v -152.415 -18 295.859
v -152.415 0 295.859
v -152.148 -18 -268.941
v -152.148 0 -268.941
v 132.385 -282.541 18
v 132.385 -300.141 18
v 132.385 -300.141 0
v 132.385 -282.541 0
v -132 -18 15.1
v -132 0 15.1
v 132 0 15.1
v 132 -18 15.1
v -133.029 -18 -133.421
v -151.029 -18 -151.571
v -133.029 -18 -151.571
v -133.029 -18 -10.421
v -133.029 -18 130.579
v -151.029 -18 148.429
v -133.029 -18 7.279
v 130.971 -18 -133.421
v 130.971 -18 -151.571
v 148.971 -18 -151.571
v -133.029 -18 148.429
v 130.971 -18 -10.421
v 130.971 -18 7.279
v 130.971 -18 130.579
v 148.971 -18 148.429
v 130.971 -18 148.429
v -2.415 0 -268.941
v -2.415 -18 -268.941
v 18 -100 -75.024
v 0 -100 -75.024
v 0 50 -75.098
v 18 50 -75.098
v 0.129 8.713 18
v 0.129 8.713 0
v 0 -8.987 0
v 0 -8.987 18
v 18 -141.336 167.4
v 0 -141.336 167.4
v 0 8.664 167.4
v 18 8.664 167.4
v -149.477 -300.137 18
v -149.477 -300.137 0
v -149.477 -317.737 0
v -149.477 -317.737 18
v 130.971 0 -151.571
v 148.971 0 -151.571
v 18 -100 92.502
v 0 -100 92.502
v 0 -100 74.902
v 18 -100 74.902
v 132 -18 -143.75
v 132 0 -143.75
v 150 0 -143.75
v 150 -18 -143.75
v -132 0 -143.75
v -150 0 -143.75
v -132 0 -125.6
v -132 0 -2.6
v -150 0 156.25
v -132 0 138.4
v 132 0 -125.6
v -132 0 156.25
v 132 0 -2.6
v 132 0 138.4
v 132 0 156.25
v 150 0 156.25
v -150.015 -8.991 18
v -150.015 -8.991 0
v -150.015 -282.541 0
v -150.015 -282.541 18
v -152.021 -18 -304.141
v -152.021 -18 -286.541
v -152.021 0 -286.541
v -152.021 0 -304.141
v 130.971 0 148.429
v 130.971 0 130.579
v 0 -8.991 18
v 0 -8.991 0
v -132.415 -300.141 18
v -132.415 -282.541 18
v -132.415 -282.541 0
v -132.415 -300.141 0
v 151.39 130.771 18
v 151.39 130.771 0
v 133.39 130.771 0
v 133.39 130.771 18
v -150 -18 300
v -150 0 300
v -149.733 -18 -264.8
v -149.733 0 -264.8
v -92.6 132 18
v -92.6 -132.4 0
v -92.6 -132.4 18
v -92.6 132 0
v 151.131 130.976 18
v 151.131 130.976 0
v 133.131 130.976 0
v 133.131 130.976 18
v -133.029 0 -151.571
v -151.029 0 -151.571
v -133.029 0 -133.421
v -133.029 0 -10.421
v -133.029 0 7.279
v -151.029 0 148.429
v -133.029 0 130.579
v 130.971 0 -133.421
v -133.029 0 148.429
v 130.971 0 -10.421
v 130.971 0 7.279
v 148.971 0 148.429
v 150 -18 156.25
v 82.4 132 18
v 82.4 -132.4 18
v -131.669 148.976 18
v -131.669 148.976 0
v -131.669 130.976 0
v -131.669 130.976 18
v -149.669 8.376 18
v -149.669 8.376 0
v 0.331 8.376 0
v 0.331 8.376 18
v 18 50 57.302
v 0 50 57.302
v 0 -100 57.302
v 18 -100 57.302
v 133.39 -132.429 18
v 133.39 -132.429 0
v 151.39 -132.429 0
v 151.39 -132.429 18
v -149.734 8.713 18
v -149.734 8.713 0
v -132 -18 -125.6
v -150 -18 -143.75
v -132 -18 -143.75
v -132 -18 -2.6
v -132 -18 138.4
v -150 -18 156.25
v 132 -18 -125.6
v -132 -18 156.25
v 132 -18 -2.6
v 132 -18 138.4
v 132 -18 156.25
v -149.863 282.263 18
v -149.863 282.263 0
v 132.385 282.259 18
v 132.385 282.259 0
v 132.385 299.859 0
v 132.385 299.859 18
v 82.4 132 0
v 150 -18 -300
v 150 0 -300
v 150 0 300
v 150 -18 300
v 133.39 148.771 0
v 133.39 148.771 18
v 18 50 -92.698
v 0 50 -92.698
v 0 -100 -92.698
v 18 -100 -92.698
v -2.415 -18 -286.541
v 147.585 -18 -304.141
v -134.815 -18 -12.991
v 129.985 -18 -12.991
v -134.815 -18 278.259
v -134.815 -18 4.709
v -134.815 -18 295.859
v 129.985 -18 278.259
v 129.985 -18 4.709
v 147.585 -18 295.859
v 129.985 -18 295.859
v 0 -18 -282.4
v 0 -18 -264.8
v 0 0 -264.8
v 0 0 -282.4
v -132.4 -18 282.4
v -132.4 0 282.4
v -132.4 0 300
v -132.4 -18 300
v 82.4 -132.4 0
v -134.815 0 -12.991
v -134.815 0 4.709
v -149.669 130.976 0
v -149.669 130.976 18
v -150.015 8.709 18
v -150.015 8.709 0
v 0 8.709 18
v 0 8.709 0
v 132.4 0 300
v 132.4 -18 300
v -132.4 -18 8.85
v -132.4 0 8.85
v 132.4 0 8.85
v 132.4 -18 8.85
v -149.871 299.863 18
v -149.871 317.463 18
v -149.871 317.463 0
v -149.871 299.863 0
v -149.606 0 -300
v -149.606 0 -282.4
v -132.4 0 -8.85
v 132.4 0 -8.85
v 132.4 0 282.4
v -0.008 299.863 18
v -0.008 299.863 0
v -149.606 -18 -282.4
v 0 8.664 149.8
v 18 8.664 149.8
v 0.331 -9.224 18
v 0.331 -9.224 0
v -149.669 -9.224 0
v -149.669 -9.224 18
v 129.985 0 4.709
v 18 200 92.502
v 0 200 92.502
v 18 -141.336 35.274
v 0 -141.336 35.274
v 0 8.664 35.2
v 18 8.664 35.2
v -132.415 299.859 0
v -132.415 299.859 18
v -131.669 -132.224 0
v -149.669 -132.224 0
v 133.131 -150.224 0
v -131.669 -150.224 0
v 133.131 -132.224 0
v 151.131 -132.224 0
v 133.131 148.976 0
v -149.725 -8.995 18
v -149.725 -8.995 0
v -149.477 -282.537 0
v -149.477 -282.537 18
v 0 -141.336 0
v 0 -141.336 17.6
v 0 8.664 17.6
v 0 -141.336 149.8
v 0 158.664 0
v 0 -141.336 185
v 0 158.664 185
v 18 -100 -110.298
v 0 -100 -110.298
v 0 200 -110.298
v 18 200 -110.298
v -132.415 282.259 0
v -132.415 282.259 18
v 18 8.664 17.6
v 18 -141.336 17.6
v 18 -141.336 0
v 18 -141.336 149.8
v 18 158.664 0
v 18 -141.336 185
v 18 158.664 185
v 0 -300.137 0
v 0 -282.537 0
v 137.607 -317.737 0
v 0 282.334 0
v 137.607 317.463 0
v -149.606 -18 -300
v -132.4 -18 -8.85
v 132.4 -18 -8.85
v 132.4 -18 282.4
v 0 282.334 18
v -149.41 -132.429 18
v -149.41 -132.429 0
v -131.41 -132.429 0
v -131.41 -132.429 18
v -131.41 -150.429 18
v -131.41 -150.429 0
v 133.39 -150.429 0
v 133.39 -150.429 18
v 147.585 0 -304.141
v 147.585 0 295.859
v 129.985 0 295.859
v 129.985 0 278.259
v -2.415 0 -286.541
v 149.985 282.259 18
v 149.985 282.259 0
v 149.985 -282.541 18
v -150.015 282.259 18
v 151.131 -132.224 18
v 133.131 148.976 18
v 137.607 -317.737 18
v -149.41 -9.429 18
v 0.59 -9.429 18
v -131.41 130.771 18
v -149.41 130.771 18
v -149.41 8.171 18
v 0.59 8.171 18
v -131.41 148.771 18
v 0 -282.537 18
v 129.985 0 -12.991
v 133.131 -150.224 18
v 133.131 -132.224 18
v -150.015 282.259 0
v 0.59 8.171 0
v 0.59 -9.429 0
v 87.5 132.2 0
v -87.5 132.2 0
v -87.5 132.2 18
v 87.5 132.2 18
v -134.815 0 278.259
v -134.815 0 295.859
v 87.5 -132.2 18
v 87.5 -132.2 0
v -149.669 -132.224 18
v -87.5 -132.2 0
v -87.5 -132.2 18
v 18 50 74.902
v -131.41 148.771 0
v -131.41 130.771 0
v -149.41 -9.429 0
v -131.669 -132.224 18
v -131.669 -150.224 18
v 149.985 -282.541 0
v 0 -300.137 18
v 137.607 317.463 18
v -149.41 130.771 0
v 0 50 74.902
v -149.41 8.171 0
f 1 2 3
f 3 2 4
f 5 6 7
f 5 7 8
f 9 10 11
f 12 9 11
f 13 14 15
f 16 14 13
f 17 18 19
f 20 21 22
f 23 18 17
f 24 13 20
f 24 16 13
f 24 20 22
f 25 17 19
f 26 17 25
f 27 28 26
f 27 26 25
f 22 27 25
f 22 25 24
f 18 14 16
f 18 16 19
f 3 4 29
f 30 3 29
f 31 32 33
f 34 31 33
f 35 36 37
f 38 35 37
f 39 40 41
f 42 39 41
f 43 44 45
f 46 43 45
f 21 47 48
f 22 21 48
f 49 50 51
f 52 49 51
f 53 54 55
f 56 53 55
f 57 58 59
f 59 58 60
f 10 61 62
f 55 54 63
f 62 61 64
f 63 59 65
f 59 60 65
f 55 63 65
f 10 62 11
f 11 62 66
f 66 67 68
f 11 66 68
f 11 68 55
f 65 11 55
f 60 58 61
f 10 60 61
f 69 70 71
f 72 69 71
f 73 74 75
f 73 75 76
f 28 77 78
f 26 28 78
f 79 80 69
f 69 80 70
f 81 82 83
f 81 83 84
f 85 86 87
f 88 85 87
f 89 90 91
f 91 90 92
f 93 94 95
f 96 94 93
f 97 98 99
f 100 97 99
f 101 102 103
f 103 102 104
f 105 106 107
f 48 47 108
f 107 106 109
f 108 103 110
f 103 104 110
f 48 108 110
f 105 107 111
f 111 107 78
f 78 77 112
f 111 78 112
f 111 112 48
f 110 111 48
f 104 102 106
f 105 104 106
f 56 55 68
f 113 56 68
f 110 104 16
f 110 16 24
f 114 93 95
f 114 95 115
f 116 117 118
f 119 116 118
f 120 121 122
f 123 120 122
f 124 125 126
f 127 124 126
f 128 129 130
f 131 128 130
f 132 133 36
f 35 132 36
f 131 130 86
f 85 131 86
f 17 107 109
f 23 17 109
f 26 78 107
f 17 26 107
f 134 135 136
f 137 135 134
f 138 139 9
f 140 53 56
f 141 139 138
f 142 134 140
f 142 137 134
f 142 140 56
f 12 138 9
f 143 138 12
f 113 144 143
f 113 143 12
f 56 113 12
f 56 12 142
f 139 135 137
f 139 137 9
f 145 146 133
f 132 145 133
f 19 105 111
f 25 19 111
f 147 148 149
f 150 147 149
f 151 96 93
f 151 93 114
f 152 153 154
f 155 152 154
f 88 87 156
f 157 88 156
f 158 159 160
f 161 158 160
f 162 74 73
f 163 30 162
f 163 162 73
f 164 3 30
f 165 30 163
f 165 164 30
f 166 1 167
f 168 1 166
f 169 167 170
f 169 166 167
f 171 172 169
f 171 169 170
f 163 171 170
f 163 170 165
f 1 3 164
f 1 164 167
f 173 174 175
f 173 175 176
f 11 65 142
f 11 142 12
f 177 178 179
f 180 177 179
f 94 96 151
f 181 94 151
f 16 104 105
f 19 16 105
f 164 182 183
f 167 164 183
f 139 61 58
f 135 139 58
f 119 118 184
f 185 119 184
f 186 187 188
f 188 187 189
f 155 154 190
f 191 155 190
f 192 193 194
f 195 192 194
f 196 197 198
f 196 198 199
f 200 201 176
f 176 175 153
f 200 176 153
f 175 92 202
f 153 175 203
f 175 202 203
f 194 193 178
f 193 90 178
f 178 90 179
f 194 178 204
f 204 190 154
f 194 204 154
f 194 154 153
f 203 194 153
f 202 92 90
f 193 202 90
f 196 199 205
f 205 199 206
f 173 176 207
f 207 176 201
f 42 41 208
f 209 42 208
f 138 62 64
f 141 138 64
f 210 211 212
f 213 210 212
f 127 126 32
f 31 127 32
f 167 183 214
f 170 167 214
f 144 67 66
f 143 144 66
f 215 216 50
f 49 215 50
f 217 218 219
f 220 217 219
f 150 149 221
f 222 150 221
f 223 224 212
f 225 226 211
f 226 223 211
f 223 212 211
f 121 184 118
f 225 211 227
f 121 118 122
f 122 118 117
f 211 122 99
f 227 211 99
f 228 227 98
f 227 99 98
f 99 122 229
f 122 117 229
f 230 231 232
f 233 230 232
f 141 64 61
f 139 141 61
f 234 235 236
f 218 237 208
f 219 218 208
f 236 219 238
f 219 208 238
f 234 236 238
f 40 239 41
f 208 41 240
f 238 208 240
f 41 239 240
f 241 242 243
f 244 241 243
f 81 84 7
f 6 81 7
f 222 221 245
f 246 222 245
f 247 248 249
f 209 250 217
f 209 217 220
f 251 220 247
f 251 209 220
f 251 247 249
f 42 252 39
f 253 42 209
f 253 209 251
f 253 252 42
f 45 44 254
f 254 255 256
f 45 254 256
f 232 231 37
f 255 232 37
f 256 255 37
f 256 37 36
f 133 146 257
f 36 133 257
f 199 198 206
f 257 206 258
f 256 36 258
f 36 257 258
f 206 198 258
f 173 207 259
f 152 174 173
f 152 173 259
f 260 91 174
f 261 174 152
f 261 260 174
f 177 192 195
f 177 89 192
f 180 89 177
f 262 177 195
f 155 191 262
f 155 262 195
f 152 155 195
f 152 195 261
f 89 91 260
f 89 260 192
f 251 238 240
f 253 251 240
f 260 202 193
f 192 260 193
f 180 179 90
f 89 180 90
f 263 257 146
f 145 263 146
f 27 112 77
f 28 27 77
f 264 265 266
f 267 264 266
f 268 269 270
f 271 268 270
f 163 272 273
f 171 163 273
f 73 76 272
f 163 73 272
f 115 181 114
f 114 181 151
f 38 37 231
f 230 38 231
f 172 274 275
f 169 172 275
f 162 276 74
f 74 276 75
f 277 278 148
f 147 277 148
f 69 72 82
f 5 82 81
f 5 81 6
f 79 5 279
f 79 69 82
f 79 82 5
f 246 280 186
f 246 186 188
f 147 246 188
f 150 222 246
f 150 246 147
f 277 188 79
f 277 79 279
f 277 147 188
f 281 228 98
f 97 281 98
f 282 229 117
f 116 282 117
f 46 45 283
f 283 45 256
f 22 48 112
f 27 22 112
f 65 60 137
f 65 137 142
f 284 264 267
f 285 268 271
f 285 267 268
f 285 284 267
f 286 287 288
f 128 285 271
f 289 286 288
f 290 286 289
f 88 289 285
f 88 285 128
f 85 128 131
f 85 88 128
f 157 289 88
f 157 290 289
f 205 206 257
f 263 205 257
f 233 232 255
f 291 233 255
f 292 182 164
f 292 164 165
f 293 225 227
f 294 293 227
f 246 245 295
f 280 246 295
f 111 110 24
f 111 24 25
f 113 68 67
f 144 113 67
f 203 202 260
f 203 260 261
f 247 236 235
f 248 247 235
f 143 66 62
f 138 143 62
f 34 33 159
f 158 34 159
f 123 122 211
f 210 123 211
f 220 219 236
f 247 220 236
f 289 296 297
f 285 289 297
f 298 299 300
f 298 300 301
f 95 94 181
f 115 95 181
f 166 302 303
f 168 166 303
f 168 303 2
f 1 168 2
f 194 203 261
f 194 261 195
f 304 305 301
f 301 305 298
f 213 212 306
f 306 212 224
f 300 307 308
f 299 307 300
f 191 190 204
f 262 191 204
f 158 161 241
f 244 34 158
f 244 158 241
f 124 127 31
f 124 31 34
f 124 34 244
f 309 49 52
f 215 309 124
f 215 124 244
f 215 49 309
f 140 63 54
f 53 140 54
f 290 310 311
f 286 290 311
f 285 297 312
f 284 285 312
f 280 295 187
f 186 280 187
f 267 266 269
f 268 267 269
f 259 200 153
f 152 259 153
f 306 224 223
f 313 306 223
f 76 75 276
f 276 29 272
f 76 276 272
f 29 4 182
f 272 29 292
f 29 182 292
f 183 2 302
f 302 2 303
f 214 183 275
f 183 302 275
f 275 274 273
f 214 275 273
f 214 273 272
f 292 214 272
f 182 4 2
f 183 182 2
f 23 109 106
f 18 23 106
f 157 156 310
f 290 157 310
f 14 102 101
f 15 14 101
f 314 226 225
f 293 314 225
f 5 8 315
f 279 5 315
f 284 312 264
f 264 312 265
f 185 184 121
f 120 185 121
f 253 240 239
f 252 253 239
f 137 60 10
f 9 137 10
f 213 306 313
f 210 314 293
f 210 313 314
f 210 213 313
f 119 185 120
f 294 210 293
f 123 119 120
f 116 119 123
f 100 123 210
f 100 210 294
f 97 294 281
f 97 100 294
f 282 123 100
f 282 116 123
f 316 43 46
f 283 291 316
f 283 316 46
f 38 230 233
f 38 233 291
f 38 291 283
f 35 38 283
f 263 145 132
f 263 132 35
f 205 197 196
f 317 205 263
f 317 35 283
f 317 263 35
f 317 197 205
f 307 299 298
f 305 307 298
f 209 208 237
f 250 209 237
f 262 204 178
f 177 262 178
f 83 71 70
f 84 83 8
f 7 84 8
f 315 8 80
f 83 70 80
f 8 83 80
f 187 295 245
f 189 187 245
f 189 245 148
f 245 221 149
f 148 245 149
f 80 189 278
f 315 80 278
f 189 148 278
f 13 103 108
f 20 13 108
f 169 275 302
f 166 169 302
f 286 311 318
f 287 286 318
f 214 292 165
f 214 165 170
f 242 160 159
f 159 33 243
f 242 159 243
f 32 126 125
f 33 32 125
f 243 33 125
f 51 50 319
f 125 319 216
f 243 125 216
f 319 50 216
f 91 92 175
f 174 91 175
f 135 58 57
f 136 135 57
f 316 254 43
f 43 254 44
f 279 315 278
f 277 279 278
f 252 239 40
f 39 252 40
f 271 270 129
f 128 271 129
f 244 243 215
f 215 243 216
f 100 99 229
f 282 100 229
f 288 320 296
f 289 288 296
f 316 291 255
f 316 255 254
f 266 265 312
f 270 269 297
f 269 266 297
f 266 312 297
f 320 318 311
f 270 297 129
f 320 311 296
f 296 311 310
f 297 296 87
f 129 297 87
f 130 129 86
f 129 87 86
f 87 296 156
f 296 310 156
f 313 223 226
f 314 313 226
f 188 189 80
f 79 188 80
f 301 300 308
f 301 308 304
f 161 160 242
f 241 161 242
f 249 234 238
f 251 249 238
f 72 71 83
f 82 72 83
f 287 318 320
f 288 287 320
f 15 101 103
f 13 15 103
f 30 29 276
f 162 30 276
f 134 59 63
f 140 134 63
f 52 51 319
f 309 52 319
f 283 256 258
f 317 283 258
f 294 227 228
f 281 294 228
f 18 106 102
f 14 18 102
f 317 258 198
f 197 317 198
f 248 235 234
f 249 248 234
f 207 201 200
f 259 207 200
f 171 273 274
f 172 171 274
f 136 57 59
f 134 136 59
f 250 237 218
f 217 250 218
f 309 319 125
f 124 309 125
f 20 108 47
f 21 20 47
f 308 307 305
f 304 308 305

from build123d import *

# Parameters (mm, degrees)
F0_W      = 264.8
F0_H      = 17.7
F12_DEPTH = 18
F1_W      = 264.8
F1_H      = 17.7
F13_DEPTH = 18
F14_DEPTH = 18
F15_DEPTH = 18
F16_DEPTH = 18
F17_DEPTH = 18
F6_W      = 264
F6_H      = 17.7
F18_DEPTH = 18
F7_W      = 264
F7_H      = 17.7
F19_DEPTH = 18
F8_W      = 175
F8_H      = 264.4
F20_DEPTH = 18
F9_W      = 175
F9_H      = 264.4
F21_DEPTH = 18
F22_DEPTH = 18
F23_DEPTH = 18


# Not quite as in the source:
# - ends of sketch curves that miss each other by under 0.0002 mm in the source are joined


with BuildPart() as f12:
    # F0 (on Front) → F12 (new body)
    with BuildSketch(Plane.XZ):
        Polygon((-149.6062576771, -300), (150, -300), (150, 300), (132.4, 300), (132.4, 282.4), (-132.4, 282.4), (-132.4, 300), (-150, 300), (-149.7333943844, -264.8), (0, -264.8), (0, -282.4), (-149.6062576771, -282.4), align=None)
        Rectangle(F0_W, F0_H, mode=Mode.SUBTRACT)
    extrude(amount=F12_DEPTH)


with BuildPart() as f13:
    # F1 (on Front) → F13 (new body)
    with BuildSketch(Plane.XZ):
        Polygon((-152.021214366, -304.1411764706), (147.5850433111, -304.1411764706), (147.5850433111, 295.8588235294), (129.9850433111, 295.8588235294), (129.9850433111, 278.2588235294), (-134.8149566889, 278.2588235294), (-134.8149566889, 295.8588235294), (-152.4149566889, 295.8588235294), (-152.1483510733, -268.9411764706), (-2.4149566889, -268.9411764706), (-2.4149566889, -286.5411764706), (-152.021214366, -286.5411764706), align=None)
        with Locations((-2.4149566889, -4.1411764706)):
            Rectangle(F1_W, F1_H, mode=Mode.SUBTRACT)
    extrude(amount=F13_DEPTH)


with BuildPart() as f14:
    # F2 (on Top) → F14 (new body)
    with BuildSketch(Plane.XY):
        Polygon((132.385053514, -282.5411762625), (149.985053514, -282.5411762625), (149.985053514, 282.2588237375), (132.385053514, 282.2588237375), (132.385053514, 299.8588237375), (-132.414946486, 299.8588237375), (-132.414946486, 282.2588237375), (-150.014946486, 282.2588237375), (-150.014946486, 8.7088237375), (-132.414946486, 8.7088237375), (0, 8.7088237375), (0, -8.9911762625), (-132.414946486, -8.9911762625), (-150.014946486, -8.9911762625), (-150.014946486, -282.5411762625), (-132.414946486, -282.5411762625), (-132.414946486, -300.1411762625), (132.385053514, -300.1411762625), align=None)
    extrude(amount=F14_DEPTH)


with BuildPart() as f15:
    # F3 (on Top) → F15 (new body)
    with BuildSketch(Plane.XY):
        Polygon((-149.8627406966, 282.263140464), (-149.7336154024, 8.713140464), (0.1289514797, 8.713140464), (0, -8.986859536), (-149.7252564861, -8.9950985407), (-149.4773061974, -282.536859536), (0, -282.536859536), (0, -300.136859536), (-149.4773061974, -300.136859536), (-149.4773061974, -317.736859536), (137.6065164804, -317.736859536), (137.6065164804, 299.863140464), (137.6065164804, 317.463140464), (-149.8710485203, 317.463140464), (-149.8710485203, 299.863140464), (-0.0082744317, 299.863140464), (0, 282.3338809885), align=None)
    extrude(amount=F15_DEPTH)


with BuildPart() as f16:
    # F4 (on Top) → F16 (new body)
    with BuildSketch(Plane.XY):
        Polygon((-131.6689617634, -150.224139154), (133.1310382366, -150.224139154), (133.1310382366, -132.224139154), (151.1310382366, -132.224139154), (151.1310382366, 130.975860846), (133.1310382366, 130.975860846), (133.1310382366, 148.975860846), (-131.6689617634, 148.975860846), (-131.6689617634, 130.975860846), (-149.6689617634, 130.975860846), (-149.6689617634, 8.375860846), (0.3310382366, 8.375860846), (0.3310382366, -9.224139154), (-149.6689617634, -9.224139154), (-149.6689617634, -132.224139154), (-131.6689617634, -132.224139154), align=None)
    extrude(amount=F16_DEPTH)


with BuildPart() as f17:
    # F5 (on Top) → F17 (new body)
    with BuildSketch(Plane.XY):
        Polygon((-131.409532547, -150.428586483), (133.390467453, -150.428586483), (133.390467453, -132.428586483), (151.390467453, -132.428586483), (151.390467453, 130.771413517), (133.390467453, 130.771413517), (133.390467453, 148.771413517), (-131.409532547, 148.771413517), (-131.409532547, 130.771413517), (-149.409532547, 130.771413517), (-149.409532547, 8.171413517), (0.590467453, 8.171413517), (0.590467453, -9.428586483), (-149.409532547, -9.428586483), (-149.409532547, -132.428586483), (-131.409532547, -132.428586483), align=None)
    extrude(amount=F17_DEPTH)


with BuildPart() as f18:
    # F6 (on Front) → F18 (new body)
    with BuildSketch(Plane.XZ):
        Polygon((130.9714285714, -151.5714973211), (148.9714285714, -151.5714973211), (148.9714285714, 148.4285026789), (130.9714285714, 148.4285026789), (130.9714285714, 130.5785026789), (-133.0285714286, 130.5785026789), (-133.0285714286, 148.4285026789), (-151.0285714286, 148.4285026789), (-151.0285714286, -151.5714973211), (-133.0285714286, -151.5714973211), (-133.0285714286, -133.4214973211), (-1.0285714286, -133.4214973211), (130.9714285714, -133.4214973211), align=None)
        with Locations((-1.0285714286, -1.5714973211)):
            Rectangle(F6_W, F6_H, mode=Mode.SUBTRACT)
    extrude(amount=F18_DEPTH)


with BuildPart() as f19:
    # F7 (on Front) → F19 (new body)
    with BuildSketch(Plane.XZ):
        Polygon((132, -143.75), (150, -143.75), (150, 156.25), (132, 156.25), (132, 138.4), (-132, 138.4), (-132, 156.25), (-150, 156.25), (-150, -143.75), (-132, -143.75), (-132, -125.6), (0, -125.6), (132, -125.6), align=None)
        with Locations((0, 6.25)):
            Rectangle(F7_W, F7_H, mode=Mode.SUBTRACT)
    extrude(amount=F19_DEPTH)


with BuildPart() as f20:
    # F8 (on Top) → F20 (new body)
    with BuildSketch(Plane.XY):
        Rectangle(F8_W, F8_H)
    extrude(amount=F20_DEPTH)


with BuildPart() as f21:
    # F9 (on Top) → F21 (new body)
    with BuildSketch(Plane.XY):
        with Locations((-5.1, -0.2)):
            Rectangle(F9_W, F9_H)
    extrude(amount=F21_DEPTH)


with BuildPart() as f22:
    # F10 (on Right) → F22 (new body)
    with BuildSketch(Plane.YZ):
        Polygon((8.6638122797, 17.6), (-141.3361877203, 17.6), (-141.3361877203, 0), (158.6638122797, 0), (158.6638182402, 185), (-141.3361817598, 185), (-141.3361817598, 167.4), (8.6638182402, 167.4), (8.6638182402, 149.8), (-141.3361817598, 149.8), (-141.3361817598, 35.2739133894), (8.6638122797, 35.2), align=None)
    extrude(amount=F22_DEPTH)


with BuildPart() as f23:
    # F11 (on Right) → F23 (new body)
    with BuildSketch(Plane.YZ):
        Polygon((49.9999985099, -92.6978261158), (-100.0000014901, -92.6978261158), (-100.0000014901, -110.2978261158), (199.9999985099, -110.2978261158), (200.0000022352, 92.5021738842), (-99.9999977648, 92.5021738842), (-99.9999977648, 74.9021738842), (50.0000022352, 74.9021738842), (50.0000022352, 57.3021738842), (-99.9999977648, 57.3021738842), (-99.9999955297, -75.0239127263), (49.9999985099, -75.0978261158), align=None)
    extrude(amount=F23_DEPTH)


solid = Compound([f12.part, f13.part, f14.part, f15.part, f16.part, f17.part, f18.part, f19.part, f20.part, f21.part, f22.part, f23.part])
